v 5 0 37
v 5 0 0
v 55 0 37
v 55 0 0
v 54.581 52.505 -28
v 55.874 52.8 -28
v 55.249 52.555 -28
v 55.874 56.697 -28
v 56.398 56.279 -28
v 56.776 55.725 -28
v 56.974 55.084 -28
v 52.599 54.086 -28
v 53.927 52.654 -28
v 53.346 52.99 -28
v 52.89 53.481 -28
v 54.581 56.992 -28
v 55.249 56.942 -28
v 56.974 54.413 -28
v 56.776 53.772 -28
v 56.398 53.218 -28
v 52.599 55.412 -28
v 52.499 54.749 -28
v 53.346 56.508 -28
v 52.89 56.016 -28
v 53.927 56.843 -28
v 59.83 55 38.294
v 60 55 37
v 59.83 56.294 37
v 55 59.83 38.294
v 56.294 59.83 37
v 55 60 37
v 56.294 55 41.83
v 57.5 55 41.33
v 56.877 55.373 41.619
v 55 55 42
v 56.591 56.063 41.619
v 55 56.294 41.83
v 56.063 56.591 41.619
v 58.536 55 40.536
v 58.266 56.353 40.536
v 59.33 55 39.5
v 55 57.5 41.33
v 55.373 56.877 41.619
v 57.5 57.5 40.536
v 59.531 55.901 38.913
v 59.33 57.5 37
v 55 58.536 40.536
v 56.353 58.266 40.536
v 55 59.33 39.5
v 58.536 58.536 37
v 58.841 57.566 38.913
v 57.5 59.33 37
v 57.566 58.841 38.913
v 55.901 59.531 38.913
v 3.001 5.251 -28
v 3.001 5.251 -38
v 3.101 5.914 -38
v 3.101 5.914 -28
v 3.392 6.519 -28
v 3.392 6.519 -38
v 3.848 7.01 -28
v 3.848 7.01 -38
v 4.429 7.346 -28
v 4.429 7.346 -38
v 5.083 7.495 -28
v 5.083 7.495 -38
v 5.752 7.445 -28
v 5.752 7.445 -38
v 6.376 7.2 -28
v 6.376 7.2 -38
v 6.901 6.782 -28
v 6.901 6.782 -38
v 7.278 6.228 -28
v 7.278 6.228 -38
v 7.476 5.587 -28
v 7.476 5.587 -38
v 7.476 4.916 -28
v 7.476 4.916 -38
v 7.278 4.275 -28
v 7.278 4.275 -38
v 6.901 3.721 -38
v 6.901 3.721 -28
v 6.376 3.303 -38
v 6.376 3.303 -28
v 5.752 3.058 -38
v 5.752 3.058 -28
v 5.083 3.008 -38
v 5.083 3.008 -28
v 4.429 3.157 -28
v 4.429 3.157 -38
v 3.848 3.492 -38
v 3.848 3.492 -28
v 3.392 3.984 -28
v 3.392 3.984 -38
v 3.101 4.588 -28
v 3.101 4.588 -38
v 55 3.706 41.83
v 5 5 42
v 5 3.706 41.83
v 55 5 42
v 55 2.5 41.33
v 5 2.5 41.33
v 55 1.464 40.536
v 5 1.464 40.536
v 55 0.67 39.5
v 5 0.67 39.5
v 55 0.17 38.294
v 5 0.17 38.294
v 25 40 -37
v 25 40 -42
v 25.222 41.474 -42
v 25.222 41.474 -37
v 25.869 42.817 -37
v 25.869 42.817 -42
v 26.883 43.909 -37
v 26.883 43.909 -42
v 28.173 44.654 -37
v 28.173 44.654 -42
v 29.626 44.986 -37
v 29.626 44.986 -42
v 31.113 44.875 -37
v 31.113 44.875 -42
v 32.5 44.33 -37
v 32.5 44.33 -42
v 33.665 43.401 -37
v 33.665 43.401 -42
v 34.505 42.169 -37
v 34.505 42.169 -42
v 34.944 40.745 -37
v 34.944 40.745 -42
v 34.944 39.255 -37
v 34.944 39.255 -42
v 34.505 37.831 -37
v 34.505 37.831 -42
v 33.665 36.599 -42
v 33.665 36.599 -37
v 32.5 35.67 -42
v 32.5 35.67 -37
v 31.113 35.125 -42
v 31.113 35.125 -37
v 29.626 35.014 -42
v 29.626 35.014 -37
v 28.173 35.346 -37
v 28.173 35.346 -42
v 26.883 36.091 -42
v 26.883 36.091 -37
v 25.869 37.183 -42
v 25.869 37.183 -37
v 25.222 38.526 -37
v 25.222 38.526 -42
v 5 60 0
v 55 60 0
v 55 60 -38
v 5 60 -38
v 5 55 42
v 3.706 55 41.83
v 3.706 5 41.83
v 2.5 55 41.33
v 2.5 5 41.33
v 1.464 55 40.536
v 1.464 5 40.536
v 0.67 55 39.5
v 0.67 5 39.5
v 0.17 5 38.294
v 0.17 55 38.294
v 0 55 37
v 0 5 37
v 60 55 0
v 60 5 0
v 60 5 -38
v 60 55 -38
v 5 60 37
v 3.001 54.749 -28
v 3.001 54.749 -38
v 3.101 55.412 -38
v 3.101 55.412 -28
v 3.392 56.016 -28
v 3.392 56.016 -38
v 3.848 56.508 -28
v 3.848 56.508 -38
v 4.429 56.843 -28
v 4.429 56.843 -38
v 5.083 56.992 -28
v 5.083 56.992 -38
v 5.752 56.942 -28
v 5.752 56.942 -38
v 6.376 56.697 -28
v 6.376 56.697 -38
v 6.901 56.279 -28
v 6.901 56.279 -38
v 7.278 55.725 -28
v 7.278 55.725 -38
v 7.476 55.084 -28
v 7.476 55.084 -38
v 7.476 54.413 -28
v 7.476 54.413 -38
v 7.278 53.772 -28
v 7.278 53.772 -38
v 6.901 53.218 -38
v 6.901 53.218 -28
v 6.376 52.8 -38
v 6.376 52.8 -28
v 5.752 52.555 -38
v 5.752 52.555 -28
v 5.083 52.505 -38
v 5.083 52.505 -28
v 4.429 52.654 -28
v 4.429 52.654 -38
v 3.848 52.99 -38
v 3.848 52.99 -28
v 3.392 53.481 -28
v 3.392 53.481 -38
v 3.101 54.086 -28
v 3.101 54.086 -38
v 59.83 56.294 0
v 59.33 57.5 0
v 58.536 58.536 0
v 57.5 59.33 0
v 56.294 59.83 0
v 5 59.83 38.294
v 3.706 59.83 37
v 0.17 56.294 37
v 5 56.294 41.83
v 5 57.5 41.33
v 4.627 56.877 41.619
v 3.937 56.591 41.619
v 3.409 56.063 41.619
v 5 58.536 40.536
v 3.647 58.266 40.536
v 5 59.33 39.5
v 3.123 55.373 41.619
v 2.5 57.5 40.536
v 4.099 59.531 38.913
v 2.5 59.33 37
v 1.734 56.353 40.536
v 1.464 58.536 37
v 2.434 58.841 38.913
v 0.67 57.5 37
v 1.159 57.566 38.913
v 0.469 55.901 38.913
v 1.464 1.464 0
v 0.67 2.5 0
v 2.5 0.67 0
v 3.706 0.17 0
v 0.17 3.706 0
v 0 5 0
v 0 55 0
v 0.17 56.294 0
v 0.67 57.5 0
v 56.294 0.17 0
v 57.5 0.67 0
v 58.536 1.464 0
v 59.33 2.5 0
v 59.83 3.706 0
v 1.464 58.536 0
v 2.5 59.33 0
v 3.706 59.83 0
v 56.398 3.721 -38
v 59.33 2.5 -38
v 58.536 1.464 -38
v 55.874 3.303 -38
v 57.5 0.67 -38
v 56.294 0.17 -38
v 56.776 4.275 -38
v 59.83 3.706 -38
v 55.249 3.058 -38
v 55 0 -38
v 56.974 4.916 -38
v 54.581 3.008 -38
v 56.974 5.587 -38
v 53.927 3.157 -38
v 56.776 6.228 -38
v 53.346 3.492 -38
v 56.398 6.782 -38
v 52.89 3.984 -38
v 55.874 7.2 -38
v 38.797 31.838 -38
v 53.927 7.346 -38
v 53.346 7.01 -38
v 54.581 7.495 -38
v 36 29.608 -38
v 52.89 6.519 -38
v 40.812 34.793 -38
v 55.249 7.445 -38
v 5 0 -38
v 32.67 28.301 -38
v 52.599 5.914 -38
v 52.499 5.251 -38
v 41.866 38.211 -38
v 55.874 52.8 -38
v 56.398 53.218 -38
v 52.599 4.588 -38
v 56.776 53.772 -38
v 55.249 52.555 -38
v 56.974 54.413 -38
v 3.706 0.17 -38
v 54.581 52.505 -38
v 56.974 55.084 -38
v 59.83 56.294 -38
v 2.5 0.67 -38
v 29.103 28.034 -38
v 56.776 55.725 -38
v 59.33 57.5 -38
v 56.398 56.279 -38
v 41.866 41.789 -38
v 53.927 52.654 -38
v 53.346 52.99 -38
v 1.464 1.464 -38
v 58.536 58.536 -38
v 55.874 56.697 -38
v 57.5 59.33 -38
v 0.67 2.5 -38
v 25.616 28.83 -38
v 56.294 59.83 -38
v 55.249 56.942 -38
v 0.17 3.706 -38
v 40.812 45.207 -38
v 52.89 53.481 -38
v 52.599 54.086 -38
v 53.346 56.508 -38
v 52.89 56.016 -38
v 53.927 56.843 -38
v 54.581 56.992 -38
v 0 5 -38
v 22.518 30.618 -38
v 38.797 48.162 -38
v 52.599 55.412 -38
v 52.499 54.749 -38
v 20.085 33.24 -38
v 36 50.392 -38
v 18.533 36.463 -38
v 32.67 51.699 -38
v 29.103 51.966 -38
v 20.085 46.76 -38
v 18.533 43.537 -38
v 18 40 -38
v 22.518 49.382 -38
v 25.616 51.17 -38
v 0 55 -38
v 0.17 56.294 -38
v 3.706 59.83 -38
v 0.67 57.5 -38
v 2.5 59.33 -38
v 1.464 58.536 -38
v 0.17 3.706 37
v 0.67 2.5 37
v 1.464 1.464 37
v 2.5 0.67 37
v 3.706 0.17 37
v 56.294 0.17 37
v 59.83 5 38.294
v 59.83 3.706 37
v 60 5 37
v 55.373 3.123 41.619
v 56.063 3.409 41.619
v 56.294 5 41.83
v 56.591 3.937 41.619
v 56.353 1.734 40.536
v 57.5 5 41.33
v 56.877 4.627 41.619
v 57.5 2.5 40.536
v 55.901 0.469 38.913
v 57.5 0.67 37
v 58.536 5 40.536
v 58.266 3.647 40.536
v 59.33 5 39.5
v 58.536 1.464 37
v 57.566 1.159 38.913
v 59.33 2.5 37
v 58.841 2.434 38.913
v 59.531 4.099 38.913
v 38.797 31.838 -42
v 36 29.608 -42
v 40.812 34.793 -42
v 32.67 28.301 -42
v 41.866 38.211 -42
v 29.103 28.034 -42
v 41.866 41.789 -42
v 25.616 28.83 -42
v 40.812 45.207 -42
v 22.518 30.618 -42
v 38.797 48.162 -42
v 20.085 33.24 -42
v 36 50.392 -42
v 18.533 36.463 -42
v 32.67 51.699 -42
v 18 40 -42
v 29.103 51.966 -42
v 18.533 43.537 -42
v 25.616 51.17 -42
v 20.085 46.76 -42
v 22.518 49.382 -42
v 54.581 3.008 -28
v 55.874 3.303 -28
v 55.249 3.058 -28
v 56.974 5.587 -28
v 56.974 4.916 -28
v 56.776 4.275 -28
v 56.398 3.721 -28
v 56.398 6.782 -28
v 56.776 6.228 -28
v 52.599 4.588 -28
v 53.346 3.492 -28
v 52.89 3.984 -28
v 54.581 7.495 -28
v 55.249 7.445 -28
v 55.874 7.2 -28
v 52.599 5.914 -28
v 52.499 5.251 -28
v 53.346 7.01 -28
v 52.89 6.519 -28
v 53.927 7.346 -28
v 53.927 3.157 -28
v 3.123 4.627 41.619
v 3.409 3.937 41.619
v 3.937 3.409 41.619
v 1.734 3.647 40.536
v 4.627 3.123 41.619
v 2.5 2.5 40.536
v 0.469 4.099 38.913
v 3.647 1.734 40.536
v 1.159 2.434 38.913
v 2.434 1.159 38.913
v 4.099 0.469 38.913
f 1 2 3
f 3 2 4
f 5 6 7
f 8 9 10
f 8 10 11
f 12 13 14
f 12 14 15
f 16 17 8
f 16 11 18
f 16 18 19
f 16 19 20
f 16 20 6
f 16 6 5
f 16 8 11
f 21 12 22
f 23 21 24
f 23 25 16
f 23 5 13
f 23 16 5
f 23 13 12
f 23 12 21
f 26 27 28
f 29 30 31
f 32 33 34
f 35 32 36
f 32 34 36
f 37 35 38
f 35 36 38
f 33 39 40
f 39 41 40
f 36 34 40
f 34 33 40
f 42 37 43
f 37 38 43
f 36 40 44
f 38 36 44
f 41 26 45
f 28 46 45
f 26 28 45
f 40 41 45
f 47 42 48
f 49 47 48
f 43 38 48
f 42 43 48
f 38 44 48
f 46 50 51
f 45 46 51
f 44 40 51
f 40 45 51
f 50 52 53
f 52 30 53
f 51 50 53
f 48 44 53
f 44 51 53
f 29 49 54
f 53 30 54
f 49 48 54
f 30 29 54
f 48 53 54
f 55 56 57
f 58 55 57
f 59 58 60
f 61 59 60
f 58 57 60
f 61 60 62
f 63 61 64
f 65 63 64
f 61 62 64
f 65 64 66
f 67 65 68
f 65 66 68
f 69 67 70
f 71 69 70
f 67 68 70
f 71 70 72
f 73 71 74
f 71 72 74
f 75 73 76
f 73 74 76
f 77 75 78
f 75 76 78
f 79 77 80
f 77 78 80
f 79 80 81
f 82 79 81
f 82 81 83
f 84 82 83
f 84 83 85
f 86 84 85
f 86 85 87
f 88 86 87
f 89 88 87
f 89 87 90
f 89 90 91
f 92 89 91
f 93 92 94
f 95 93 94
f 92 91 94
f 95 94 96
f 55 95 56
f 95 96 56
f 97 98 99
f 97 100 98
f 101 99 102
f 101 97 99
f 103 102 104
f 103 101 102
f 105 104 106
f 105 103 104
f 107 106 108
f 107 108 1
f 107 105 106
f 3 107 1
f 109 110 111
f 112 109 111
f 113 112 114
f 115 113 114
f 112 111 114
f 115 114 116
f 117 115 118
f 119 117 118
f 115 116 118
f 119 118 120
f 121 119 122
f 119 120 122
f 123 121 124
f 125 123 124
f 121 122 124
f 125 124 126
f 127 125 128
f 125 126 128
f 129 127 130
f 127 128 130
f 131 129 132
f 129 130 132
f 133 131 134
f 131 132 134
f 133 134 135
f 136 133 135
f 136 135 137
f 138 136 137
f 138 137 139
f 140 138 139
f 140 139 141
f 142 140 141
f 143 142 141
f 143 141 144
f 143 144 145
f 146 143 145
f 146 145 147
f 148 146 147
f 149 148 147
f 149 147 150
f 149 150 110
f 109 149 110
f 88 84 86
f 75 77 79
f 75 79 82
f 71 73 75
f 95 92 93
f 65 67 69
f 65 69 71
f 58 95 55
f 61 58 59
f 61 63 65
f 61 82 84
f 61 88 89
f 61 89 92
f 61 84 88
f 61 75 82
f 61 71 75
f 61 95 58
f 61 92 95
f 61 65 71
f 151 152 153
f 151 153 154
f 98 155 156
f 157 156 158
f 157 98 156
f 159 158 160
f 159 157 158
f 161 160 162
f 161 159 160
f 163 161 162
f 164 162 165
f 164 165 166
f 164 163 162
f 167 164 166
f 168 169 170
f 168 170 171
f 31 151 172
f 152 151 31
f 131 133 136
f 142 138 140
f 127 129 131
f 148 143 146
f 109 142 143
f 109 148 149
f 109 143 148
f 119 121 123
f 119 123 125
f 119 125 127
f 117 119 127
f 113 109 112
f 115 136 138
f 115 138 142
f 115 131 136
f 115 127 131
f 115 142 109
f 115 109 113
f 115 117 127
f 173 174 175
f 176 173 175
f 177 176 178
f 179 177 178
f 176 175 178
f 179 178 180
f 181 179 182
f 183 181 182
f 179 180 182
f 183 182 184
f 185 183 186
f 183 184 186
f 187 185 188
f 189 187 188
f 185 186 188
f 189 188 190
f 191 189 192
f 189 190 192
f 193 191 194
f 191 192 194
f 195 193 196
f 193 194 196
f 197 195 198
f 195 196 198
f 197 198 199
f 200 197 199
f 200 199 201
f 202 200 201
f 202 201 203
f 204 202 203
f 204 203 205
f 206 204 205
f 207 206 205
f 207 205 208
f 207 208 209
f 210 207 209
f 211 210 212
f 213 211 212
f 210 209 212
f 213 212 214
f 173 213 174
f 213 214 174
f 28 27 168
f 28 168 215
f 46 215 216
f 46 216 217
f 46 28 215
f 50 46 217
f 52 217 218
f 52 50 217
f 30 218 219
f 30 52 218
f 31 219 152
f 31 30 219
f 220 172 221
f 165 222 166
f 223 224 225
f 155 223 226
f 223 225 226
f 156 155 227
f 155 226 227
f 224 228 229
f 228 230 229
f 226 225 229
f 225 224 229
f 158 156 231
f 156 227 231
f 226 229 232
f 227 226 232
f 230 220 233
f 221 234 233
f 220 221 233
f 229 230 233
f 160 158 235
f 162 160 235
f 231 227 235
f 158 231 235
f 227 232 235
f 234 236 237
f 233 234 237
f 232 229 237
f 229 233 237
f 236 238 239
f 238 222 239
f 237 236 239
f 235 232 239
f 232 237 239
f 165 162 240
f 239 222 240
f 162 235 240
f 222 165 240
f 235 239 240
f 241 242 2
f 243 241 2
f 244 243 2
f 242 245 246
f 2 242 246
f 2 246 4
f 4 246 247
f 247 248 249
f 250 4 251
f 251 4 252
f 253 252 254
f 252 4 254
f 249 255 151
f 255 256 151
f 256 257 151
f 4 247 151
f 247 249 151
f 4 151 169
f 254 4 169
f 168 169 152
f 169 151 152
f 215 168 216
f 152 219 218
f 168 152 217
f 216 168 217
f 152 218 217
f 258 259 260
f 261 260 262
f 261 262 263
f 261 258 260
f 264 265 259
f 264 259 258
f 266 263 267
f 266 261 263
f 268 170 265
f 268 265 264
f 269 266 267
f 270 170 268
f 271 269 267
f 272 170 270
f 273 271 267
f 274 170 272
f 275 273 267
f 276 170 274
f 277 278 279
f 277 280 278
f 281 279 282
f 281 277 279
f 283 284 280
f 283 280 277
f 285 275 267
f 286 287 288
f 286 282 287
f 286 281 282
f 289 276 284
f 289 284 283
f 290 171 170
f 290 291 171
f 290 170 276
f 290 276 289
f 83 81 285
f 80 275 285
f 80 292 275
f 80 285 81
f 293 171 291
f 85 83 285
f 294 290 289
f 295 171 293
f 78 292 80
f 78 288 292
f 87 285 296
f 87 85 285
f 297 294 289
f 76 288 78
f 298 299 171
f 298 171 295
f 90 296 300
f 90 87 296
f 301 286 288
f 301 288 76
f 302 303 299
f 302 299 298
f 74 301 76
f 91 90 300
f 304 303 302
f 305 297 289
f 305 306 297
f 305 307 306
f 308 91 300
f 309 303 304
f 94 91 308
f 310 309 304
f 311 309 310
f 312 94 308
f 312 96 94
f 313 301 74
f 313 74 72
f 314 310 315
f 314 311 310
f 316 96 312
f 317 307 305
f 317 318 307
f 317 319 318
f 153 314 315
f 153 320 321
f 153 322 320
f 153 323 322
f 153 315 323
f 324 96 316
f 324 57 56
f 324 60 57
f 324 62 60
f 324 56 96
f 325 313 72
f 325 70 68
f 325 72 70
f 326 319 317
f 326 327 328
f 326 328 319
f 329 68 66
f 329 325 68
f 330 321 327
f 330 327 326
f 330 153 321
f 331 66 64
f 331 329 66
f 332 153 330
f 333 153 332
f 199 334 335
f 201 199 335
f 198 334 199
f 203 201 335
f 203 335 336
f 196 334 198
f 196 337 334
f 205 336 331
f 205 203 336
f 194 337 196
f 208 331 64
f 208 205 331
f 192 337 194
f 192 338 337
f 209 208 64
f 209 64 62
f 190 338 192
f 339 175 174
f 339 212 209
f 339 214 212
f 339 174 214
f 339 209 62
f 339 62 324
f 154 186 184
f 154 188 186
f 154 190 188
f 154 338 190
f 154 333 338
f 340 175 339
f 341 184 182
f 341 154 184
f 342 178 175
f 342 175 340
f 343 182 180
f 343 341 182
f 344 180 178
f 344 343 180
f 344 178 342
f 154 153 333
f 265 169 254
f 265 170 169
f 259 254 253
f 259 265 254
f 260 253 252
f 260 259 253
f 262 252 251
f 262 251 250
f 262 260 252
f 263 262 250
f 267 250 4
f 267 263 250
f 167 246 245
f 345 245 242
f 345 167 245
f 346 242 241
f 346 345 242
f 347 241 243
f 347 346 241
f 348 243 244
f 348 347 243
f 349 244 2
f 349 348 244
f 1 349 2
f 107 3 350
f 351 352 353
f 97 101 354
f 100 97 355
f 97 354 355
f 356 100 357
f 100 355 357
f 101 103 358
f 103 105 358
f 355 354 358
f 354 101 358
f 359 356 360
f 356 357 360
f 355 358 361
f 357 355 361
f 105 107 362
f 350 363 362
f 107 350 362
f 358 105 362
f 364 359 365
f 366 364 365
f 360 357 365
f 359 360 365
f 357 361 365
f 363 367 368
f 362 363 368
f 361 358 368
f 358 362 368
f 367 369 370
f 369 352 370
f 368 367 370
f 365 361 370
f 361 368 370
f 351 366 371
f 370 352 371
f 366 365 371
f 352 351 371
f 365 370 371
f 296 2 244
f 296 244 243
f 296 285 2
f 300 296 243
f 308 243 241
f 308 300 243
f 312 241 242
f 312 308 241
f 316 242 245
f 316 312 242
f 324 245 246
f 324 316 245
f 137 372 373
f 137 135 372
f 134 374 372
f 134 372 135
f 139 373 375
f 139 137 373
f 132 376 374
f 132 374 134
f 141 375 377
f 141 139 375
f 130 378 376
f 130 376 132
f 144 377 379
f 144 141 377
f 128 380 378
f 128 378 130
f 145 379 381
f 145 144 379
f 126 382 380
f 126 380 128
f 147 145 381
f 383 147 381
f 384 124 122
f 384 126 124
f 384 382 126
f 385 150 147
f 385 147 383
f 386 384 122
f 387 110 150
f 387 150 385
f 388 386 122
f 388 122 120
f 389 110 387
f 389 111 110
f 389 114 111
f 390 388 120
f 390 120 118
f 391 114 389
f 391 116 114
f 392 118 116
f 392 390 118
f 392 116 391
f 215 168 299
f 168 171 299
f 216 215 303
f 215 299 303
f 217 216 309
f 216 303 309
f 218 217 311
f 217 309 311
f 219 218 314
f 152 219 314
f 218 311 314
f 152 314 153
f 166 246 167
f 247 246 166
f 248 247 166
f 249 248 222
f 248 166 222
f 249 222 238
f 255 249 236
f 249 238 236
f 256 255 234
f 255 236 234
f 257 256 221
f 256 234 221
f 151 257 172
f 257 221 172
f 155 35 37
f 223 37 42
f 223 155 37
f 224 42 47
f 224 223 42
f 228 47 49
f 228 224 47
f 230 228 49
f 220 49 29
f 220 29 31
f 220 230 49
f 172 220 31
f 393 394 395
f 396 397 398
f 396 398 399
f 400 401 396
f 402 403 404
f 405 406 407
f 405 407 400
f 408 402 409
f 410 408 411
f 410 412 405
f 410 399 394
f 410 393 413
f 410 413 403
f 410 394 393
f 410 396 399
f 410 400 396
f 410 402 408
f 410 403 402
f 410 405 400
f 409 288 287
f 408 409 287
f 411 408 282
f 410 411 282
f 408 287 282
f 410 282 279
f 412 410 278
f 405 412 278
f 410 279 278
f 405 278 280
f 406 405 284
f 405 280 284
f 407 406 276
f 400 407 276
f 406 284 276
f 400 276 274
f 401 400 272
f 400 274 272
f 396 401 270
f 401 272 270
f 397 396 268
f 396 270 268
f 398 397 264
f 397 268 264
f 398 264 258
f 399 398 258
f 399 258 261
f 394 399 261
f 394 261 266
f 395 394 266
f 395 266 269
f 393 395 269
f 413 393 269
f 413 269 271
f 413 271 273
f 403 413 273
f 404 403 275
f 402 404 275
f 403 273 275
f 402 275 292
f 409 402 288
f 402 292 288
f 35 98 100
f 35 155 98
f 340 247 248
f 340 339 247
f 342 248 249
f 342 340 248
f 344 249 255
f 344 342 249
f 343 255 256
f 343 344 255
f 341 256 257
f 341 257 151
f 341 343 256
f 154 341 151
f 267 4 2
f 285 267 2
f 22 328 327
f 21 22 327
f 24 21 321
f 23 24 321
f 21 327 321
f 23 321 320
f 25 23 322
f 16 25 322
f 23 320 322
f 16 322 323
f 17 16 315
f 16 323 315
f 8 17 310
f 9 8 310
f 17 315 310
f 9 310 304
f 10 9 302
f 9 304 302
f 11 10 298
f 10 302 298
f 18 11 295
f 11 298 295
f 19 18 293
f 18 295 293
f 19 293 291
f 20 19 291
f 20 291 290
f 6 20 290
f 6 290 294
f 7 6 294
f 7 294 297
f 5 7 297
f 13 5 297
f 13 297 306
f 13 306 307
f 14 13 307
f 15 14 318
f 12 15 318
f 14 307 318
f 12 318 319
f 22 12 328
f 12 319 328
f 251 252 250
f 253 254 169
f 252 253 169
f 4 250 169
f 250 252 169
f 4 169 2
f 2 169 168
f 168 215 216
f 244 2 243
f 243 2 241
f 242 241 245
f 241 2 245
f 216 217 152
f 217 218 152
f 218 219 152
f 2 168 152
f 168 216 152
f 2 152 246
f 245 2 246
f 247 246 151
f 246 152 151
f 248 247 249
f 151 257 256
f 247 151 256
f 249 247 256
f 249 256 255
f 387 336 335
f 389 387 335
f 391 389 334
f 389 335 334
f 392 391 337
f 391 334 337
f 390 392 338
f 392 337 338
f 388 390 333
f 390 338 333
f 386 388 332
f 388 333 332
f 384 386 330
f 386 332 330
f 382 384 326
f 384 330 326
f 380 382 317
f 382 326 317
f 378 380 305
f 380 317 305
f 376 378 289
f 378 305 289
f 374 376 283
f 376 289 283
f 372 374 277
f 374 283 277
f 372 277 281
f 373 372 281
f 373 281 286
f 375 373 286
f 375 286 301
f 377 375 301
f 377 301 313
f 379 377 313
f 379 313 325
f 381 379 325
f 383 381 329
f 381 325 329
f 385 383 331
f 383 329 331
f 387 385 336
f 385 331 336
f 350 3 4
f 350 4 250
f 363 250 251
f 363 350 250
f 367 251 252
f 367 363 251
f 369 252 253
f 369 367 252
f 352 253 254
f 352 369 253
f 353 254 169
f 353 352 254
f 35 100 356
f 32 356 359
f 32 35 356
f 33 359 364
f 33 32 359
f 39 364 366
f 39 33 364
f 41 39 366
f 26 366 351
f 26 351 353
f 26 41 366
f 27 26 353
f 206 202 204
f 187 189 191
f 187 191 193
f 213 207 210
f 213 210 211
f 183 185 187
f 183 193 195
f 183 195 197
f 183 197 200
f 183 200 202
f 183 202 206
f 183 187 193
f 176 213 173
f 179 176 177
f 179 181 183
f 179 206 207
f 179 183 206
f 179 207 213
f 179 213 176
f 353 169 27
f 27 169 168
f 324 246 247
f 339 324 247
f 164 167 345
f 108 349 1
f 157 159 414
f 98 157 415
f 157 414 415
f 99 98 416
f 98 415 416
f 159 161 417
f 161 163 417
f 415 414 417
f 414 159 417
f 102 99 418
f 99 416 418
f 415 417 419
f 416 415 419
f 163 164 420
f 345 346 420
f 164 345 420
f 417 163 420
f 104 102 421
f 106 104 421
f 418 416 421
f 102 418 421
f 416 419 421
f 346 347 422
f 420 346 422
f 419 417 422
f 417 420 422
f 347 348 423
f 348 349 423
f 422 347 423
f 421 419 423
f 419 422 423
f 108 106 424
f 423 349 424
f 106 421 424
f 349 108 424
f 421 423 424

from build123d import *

# Parameters (mm, degrees)
SKETCH2_W           = 60
SKETCH2_H           = 60
BOSS_EXTRUDE1_DEPTH = 42
SKETCH3_W           = 60
SKETCH3_H           = 60
BOSS_EXTRUDE2_DEPTH = 38
FILLET1_R           = 5
FILLET2_R           = 5
FILLET3_R           = 5
SKETCH4_R           = 2.25
CUT_EXTRUDE1_DEPTH  = 10
SKETCH5_R           = 12
BOSS_EXTRUDE3_DEPTH = 4
SKETCH6_R           = 5
BOSS_EXTRUDE4_DEPTH = 28
CUT_EXTRUDE2_DEPTH  = 28
SKETCH8_R           = 5
CUT_EXTRUDE3_DEPTH  = 33


with BuildPart() as part:
    # Sketch2 → Boss-Extrude1 (new body)
    with BuildSketch(Plane.XY):
        with Locations((30, 30)):
            Rectangle(SKETCH2_W, SKETCH2_H)
    extrude(amount=BOSS_EXTRUDE1_DEPTH)

    # Fillet1
    fillet1_edges = [part.edges().sort_by_distance(p)[0] for p in [
        (0, 60, 21),
        (60, 60, 21),
        (60, 0, 21),
        (0, 0, 21),
    ]]
    fillet(fillet1_edges, radius=FILLET1_R)

    # Fillet3
    fillet3_edges = [part.edges().sort_by_distance(p)[0] for p in [
        (30, 0, 42),
        (0, 30, 42),
        (60, 30, 42),
        (30, 60, 42),
        (58.535533906, 58.535533906, 42),
        (1.464466094, 58.535533906, 42),
        (58.535533906, 1.464466094, 42),
        (1.464466094, 1.464466094, 42),
    ]]
    fillet(fillet3_edges, radius=FILLET3_R)


with BuildPart() as body_2:
    # Sketch3 → Boss-Extrude2 (new body)
    with BuildSketch(Plane(origin=(0, 0, 0), x_dir=(-1, 0, 0), z_dir=(0, 0, -1))):
        with Locations((-30, 30)):
            Rectangle(SKETCH3_W, SKETCH3_H)
    extrude(amount=BOSS_EXTRUDE2_DEPTH)

    # Fillet2
    fillet2_edges = [body_2.edges().sort_by_distance(p)[0] for p in [
        (60, 0, -19),
        (60, 60, -19),
        (0, 60, -19),
        (0, 0, -19),
    ]]
    fillet(fillet2_edges, radius=FILLET2_R)

    # Sketch4 → Cut-Extrude1 (cut)
    with BuildSketch(Plane(origin=(0, 0, -38), x_dir=(-1, 0, 0), z_dir=(0, 0, -1))):
        with Locations((-5.251262658, 54.748737342)):
            Circle(SKETCH4_R)
        with Locations((-54.748737342, 54.748737342)):
            Circle(SKETCH4_R)
        with Locations((-54.748737342, 5.251262658)):
            Circle(SKETCH4_R)
        with Locations((-5.251262658, 5.251262658)):
            Circle(SKETCH4_R)
    extrude(amount=-CUT_EXTRUDE1_DEPTH, mode=Mode.SUBTRACT)

    # Sketch5 → Boss-Extrude3 (add)
    with BuildSketch(Plane(origin=(0, 0, -38), x_dir=(-1, 0, 0), z_dir=(0, 0, -1))):
        with Locations((-30, 40)):
            Circle(SKETCH5_R)
    extrude(amount=BOSS_EXTRUDE3_DEPTH)

    # Sketch6 → Boss-Extrude4 (add)
    with BuildSketch(Plane(origin=(0, 0, -42), x_dir=(-1, 0, 0), z_dir=(0, 0, -1))):
        with Locations((-30, 40)):
            Circle(SKETCH6_R)
    extrude(amount=BOSS_EXTRUDE4_DEPTH)

    # Sketch7 → Cut-Extrude2 (cut)
    with BuildSketch(Plane(origin=(0, 42.5, 0), x_dir=(1, 0, 0), z_dir=(0, 1, 0))):
        with BuildLine():
            Line((28, 47), (28, 70))
            Line((28, 70), (32, 70))
            Line((32, 70), (32, 47))
            ThreePointArc((32, 47), (30, 45), (28, 47))
        make_face()
    extrude(amount=CUT_EXTRUDE2_DEPTH, mode=Mode.SUBTRACT)

    # Sketch8 → Cut-Extrude3 (cut)
    with BuildSketch(Plane(origin=(0, 0, -70), x_dir=(-1, 0, 0), z_dir=(0, 0, -1))):
        with Locations((-30, 40)):
            Circle(SKETCH8_R)
    extrude(amount=-CUT_EXTRUDE3_DEPTH, mode=Mode.SUBTRACT)


solid = Compound([part.part, body_2.part])
